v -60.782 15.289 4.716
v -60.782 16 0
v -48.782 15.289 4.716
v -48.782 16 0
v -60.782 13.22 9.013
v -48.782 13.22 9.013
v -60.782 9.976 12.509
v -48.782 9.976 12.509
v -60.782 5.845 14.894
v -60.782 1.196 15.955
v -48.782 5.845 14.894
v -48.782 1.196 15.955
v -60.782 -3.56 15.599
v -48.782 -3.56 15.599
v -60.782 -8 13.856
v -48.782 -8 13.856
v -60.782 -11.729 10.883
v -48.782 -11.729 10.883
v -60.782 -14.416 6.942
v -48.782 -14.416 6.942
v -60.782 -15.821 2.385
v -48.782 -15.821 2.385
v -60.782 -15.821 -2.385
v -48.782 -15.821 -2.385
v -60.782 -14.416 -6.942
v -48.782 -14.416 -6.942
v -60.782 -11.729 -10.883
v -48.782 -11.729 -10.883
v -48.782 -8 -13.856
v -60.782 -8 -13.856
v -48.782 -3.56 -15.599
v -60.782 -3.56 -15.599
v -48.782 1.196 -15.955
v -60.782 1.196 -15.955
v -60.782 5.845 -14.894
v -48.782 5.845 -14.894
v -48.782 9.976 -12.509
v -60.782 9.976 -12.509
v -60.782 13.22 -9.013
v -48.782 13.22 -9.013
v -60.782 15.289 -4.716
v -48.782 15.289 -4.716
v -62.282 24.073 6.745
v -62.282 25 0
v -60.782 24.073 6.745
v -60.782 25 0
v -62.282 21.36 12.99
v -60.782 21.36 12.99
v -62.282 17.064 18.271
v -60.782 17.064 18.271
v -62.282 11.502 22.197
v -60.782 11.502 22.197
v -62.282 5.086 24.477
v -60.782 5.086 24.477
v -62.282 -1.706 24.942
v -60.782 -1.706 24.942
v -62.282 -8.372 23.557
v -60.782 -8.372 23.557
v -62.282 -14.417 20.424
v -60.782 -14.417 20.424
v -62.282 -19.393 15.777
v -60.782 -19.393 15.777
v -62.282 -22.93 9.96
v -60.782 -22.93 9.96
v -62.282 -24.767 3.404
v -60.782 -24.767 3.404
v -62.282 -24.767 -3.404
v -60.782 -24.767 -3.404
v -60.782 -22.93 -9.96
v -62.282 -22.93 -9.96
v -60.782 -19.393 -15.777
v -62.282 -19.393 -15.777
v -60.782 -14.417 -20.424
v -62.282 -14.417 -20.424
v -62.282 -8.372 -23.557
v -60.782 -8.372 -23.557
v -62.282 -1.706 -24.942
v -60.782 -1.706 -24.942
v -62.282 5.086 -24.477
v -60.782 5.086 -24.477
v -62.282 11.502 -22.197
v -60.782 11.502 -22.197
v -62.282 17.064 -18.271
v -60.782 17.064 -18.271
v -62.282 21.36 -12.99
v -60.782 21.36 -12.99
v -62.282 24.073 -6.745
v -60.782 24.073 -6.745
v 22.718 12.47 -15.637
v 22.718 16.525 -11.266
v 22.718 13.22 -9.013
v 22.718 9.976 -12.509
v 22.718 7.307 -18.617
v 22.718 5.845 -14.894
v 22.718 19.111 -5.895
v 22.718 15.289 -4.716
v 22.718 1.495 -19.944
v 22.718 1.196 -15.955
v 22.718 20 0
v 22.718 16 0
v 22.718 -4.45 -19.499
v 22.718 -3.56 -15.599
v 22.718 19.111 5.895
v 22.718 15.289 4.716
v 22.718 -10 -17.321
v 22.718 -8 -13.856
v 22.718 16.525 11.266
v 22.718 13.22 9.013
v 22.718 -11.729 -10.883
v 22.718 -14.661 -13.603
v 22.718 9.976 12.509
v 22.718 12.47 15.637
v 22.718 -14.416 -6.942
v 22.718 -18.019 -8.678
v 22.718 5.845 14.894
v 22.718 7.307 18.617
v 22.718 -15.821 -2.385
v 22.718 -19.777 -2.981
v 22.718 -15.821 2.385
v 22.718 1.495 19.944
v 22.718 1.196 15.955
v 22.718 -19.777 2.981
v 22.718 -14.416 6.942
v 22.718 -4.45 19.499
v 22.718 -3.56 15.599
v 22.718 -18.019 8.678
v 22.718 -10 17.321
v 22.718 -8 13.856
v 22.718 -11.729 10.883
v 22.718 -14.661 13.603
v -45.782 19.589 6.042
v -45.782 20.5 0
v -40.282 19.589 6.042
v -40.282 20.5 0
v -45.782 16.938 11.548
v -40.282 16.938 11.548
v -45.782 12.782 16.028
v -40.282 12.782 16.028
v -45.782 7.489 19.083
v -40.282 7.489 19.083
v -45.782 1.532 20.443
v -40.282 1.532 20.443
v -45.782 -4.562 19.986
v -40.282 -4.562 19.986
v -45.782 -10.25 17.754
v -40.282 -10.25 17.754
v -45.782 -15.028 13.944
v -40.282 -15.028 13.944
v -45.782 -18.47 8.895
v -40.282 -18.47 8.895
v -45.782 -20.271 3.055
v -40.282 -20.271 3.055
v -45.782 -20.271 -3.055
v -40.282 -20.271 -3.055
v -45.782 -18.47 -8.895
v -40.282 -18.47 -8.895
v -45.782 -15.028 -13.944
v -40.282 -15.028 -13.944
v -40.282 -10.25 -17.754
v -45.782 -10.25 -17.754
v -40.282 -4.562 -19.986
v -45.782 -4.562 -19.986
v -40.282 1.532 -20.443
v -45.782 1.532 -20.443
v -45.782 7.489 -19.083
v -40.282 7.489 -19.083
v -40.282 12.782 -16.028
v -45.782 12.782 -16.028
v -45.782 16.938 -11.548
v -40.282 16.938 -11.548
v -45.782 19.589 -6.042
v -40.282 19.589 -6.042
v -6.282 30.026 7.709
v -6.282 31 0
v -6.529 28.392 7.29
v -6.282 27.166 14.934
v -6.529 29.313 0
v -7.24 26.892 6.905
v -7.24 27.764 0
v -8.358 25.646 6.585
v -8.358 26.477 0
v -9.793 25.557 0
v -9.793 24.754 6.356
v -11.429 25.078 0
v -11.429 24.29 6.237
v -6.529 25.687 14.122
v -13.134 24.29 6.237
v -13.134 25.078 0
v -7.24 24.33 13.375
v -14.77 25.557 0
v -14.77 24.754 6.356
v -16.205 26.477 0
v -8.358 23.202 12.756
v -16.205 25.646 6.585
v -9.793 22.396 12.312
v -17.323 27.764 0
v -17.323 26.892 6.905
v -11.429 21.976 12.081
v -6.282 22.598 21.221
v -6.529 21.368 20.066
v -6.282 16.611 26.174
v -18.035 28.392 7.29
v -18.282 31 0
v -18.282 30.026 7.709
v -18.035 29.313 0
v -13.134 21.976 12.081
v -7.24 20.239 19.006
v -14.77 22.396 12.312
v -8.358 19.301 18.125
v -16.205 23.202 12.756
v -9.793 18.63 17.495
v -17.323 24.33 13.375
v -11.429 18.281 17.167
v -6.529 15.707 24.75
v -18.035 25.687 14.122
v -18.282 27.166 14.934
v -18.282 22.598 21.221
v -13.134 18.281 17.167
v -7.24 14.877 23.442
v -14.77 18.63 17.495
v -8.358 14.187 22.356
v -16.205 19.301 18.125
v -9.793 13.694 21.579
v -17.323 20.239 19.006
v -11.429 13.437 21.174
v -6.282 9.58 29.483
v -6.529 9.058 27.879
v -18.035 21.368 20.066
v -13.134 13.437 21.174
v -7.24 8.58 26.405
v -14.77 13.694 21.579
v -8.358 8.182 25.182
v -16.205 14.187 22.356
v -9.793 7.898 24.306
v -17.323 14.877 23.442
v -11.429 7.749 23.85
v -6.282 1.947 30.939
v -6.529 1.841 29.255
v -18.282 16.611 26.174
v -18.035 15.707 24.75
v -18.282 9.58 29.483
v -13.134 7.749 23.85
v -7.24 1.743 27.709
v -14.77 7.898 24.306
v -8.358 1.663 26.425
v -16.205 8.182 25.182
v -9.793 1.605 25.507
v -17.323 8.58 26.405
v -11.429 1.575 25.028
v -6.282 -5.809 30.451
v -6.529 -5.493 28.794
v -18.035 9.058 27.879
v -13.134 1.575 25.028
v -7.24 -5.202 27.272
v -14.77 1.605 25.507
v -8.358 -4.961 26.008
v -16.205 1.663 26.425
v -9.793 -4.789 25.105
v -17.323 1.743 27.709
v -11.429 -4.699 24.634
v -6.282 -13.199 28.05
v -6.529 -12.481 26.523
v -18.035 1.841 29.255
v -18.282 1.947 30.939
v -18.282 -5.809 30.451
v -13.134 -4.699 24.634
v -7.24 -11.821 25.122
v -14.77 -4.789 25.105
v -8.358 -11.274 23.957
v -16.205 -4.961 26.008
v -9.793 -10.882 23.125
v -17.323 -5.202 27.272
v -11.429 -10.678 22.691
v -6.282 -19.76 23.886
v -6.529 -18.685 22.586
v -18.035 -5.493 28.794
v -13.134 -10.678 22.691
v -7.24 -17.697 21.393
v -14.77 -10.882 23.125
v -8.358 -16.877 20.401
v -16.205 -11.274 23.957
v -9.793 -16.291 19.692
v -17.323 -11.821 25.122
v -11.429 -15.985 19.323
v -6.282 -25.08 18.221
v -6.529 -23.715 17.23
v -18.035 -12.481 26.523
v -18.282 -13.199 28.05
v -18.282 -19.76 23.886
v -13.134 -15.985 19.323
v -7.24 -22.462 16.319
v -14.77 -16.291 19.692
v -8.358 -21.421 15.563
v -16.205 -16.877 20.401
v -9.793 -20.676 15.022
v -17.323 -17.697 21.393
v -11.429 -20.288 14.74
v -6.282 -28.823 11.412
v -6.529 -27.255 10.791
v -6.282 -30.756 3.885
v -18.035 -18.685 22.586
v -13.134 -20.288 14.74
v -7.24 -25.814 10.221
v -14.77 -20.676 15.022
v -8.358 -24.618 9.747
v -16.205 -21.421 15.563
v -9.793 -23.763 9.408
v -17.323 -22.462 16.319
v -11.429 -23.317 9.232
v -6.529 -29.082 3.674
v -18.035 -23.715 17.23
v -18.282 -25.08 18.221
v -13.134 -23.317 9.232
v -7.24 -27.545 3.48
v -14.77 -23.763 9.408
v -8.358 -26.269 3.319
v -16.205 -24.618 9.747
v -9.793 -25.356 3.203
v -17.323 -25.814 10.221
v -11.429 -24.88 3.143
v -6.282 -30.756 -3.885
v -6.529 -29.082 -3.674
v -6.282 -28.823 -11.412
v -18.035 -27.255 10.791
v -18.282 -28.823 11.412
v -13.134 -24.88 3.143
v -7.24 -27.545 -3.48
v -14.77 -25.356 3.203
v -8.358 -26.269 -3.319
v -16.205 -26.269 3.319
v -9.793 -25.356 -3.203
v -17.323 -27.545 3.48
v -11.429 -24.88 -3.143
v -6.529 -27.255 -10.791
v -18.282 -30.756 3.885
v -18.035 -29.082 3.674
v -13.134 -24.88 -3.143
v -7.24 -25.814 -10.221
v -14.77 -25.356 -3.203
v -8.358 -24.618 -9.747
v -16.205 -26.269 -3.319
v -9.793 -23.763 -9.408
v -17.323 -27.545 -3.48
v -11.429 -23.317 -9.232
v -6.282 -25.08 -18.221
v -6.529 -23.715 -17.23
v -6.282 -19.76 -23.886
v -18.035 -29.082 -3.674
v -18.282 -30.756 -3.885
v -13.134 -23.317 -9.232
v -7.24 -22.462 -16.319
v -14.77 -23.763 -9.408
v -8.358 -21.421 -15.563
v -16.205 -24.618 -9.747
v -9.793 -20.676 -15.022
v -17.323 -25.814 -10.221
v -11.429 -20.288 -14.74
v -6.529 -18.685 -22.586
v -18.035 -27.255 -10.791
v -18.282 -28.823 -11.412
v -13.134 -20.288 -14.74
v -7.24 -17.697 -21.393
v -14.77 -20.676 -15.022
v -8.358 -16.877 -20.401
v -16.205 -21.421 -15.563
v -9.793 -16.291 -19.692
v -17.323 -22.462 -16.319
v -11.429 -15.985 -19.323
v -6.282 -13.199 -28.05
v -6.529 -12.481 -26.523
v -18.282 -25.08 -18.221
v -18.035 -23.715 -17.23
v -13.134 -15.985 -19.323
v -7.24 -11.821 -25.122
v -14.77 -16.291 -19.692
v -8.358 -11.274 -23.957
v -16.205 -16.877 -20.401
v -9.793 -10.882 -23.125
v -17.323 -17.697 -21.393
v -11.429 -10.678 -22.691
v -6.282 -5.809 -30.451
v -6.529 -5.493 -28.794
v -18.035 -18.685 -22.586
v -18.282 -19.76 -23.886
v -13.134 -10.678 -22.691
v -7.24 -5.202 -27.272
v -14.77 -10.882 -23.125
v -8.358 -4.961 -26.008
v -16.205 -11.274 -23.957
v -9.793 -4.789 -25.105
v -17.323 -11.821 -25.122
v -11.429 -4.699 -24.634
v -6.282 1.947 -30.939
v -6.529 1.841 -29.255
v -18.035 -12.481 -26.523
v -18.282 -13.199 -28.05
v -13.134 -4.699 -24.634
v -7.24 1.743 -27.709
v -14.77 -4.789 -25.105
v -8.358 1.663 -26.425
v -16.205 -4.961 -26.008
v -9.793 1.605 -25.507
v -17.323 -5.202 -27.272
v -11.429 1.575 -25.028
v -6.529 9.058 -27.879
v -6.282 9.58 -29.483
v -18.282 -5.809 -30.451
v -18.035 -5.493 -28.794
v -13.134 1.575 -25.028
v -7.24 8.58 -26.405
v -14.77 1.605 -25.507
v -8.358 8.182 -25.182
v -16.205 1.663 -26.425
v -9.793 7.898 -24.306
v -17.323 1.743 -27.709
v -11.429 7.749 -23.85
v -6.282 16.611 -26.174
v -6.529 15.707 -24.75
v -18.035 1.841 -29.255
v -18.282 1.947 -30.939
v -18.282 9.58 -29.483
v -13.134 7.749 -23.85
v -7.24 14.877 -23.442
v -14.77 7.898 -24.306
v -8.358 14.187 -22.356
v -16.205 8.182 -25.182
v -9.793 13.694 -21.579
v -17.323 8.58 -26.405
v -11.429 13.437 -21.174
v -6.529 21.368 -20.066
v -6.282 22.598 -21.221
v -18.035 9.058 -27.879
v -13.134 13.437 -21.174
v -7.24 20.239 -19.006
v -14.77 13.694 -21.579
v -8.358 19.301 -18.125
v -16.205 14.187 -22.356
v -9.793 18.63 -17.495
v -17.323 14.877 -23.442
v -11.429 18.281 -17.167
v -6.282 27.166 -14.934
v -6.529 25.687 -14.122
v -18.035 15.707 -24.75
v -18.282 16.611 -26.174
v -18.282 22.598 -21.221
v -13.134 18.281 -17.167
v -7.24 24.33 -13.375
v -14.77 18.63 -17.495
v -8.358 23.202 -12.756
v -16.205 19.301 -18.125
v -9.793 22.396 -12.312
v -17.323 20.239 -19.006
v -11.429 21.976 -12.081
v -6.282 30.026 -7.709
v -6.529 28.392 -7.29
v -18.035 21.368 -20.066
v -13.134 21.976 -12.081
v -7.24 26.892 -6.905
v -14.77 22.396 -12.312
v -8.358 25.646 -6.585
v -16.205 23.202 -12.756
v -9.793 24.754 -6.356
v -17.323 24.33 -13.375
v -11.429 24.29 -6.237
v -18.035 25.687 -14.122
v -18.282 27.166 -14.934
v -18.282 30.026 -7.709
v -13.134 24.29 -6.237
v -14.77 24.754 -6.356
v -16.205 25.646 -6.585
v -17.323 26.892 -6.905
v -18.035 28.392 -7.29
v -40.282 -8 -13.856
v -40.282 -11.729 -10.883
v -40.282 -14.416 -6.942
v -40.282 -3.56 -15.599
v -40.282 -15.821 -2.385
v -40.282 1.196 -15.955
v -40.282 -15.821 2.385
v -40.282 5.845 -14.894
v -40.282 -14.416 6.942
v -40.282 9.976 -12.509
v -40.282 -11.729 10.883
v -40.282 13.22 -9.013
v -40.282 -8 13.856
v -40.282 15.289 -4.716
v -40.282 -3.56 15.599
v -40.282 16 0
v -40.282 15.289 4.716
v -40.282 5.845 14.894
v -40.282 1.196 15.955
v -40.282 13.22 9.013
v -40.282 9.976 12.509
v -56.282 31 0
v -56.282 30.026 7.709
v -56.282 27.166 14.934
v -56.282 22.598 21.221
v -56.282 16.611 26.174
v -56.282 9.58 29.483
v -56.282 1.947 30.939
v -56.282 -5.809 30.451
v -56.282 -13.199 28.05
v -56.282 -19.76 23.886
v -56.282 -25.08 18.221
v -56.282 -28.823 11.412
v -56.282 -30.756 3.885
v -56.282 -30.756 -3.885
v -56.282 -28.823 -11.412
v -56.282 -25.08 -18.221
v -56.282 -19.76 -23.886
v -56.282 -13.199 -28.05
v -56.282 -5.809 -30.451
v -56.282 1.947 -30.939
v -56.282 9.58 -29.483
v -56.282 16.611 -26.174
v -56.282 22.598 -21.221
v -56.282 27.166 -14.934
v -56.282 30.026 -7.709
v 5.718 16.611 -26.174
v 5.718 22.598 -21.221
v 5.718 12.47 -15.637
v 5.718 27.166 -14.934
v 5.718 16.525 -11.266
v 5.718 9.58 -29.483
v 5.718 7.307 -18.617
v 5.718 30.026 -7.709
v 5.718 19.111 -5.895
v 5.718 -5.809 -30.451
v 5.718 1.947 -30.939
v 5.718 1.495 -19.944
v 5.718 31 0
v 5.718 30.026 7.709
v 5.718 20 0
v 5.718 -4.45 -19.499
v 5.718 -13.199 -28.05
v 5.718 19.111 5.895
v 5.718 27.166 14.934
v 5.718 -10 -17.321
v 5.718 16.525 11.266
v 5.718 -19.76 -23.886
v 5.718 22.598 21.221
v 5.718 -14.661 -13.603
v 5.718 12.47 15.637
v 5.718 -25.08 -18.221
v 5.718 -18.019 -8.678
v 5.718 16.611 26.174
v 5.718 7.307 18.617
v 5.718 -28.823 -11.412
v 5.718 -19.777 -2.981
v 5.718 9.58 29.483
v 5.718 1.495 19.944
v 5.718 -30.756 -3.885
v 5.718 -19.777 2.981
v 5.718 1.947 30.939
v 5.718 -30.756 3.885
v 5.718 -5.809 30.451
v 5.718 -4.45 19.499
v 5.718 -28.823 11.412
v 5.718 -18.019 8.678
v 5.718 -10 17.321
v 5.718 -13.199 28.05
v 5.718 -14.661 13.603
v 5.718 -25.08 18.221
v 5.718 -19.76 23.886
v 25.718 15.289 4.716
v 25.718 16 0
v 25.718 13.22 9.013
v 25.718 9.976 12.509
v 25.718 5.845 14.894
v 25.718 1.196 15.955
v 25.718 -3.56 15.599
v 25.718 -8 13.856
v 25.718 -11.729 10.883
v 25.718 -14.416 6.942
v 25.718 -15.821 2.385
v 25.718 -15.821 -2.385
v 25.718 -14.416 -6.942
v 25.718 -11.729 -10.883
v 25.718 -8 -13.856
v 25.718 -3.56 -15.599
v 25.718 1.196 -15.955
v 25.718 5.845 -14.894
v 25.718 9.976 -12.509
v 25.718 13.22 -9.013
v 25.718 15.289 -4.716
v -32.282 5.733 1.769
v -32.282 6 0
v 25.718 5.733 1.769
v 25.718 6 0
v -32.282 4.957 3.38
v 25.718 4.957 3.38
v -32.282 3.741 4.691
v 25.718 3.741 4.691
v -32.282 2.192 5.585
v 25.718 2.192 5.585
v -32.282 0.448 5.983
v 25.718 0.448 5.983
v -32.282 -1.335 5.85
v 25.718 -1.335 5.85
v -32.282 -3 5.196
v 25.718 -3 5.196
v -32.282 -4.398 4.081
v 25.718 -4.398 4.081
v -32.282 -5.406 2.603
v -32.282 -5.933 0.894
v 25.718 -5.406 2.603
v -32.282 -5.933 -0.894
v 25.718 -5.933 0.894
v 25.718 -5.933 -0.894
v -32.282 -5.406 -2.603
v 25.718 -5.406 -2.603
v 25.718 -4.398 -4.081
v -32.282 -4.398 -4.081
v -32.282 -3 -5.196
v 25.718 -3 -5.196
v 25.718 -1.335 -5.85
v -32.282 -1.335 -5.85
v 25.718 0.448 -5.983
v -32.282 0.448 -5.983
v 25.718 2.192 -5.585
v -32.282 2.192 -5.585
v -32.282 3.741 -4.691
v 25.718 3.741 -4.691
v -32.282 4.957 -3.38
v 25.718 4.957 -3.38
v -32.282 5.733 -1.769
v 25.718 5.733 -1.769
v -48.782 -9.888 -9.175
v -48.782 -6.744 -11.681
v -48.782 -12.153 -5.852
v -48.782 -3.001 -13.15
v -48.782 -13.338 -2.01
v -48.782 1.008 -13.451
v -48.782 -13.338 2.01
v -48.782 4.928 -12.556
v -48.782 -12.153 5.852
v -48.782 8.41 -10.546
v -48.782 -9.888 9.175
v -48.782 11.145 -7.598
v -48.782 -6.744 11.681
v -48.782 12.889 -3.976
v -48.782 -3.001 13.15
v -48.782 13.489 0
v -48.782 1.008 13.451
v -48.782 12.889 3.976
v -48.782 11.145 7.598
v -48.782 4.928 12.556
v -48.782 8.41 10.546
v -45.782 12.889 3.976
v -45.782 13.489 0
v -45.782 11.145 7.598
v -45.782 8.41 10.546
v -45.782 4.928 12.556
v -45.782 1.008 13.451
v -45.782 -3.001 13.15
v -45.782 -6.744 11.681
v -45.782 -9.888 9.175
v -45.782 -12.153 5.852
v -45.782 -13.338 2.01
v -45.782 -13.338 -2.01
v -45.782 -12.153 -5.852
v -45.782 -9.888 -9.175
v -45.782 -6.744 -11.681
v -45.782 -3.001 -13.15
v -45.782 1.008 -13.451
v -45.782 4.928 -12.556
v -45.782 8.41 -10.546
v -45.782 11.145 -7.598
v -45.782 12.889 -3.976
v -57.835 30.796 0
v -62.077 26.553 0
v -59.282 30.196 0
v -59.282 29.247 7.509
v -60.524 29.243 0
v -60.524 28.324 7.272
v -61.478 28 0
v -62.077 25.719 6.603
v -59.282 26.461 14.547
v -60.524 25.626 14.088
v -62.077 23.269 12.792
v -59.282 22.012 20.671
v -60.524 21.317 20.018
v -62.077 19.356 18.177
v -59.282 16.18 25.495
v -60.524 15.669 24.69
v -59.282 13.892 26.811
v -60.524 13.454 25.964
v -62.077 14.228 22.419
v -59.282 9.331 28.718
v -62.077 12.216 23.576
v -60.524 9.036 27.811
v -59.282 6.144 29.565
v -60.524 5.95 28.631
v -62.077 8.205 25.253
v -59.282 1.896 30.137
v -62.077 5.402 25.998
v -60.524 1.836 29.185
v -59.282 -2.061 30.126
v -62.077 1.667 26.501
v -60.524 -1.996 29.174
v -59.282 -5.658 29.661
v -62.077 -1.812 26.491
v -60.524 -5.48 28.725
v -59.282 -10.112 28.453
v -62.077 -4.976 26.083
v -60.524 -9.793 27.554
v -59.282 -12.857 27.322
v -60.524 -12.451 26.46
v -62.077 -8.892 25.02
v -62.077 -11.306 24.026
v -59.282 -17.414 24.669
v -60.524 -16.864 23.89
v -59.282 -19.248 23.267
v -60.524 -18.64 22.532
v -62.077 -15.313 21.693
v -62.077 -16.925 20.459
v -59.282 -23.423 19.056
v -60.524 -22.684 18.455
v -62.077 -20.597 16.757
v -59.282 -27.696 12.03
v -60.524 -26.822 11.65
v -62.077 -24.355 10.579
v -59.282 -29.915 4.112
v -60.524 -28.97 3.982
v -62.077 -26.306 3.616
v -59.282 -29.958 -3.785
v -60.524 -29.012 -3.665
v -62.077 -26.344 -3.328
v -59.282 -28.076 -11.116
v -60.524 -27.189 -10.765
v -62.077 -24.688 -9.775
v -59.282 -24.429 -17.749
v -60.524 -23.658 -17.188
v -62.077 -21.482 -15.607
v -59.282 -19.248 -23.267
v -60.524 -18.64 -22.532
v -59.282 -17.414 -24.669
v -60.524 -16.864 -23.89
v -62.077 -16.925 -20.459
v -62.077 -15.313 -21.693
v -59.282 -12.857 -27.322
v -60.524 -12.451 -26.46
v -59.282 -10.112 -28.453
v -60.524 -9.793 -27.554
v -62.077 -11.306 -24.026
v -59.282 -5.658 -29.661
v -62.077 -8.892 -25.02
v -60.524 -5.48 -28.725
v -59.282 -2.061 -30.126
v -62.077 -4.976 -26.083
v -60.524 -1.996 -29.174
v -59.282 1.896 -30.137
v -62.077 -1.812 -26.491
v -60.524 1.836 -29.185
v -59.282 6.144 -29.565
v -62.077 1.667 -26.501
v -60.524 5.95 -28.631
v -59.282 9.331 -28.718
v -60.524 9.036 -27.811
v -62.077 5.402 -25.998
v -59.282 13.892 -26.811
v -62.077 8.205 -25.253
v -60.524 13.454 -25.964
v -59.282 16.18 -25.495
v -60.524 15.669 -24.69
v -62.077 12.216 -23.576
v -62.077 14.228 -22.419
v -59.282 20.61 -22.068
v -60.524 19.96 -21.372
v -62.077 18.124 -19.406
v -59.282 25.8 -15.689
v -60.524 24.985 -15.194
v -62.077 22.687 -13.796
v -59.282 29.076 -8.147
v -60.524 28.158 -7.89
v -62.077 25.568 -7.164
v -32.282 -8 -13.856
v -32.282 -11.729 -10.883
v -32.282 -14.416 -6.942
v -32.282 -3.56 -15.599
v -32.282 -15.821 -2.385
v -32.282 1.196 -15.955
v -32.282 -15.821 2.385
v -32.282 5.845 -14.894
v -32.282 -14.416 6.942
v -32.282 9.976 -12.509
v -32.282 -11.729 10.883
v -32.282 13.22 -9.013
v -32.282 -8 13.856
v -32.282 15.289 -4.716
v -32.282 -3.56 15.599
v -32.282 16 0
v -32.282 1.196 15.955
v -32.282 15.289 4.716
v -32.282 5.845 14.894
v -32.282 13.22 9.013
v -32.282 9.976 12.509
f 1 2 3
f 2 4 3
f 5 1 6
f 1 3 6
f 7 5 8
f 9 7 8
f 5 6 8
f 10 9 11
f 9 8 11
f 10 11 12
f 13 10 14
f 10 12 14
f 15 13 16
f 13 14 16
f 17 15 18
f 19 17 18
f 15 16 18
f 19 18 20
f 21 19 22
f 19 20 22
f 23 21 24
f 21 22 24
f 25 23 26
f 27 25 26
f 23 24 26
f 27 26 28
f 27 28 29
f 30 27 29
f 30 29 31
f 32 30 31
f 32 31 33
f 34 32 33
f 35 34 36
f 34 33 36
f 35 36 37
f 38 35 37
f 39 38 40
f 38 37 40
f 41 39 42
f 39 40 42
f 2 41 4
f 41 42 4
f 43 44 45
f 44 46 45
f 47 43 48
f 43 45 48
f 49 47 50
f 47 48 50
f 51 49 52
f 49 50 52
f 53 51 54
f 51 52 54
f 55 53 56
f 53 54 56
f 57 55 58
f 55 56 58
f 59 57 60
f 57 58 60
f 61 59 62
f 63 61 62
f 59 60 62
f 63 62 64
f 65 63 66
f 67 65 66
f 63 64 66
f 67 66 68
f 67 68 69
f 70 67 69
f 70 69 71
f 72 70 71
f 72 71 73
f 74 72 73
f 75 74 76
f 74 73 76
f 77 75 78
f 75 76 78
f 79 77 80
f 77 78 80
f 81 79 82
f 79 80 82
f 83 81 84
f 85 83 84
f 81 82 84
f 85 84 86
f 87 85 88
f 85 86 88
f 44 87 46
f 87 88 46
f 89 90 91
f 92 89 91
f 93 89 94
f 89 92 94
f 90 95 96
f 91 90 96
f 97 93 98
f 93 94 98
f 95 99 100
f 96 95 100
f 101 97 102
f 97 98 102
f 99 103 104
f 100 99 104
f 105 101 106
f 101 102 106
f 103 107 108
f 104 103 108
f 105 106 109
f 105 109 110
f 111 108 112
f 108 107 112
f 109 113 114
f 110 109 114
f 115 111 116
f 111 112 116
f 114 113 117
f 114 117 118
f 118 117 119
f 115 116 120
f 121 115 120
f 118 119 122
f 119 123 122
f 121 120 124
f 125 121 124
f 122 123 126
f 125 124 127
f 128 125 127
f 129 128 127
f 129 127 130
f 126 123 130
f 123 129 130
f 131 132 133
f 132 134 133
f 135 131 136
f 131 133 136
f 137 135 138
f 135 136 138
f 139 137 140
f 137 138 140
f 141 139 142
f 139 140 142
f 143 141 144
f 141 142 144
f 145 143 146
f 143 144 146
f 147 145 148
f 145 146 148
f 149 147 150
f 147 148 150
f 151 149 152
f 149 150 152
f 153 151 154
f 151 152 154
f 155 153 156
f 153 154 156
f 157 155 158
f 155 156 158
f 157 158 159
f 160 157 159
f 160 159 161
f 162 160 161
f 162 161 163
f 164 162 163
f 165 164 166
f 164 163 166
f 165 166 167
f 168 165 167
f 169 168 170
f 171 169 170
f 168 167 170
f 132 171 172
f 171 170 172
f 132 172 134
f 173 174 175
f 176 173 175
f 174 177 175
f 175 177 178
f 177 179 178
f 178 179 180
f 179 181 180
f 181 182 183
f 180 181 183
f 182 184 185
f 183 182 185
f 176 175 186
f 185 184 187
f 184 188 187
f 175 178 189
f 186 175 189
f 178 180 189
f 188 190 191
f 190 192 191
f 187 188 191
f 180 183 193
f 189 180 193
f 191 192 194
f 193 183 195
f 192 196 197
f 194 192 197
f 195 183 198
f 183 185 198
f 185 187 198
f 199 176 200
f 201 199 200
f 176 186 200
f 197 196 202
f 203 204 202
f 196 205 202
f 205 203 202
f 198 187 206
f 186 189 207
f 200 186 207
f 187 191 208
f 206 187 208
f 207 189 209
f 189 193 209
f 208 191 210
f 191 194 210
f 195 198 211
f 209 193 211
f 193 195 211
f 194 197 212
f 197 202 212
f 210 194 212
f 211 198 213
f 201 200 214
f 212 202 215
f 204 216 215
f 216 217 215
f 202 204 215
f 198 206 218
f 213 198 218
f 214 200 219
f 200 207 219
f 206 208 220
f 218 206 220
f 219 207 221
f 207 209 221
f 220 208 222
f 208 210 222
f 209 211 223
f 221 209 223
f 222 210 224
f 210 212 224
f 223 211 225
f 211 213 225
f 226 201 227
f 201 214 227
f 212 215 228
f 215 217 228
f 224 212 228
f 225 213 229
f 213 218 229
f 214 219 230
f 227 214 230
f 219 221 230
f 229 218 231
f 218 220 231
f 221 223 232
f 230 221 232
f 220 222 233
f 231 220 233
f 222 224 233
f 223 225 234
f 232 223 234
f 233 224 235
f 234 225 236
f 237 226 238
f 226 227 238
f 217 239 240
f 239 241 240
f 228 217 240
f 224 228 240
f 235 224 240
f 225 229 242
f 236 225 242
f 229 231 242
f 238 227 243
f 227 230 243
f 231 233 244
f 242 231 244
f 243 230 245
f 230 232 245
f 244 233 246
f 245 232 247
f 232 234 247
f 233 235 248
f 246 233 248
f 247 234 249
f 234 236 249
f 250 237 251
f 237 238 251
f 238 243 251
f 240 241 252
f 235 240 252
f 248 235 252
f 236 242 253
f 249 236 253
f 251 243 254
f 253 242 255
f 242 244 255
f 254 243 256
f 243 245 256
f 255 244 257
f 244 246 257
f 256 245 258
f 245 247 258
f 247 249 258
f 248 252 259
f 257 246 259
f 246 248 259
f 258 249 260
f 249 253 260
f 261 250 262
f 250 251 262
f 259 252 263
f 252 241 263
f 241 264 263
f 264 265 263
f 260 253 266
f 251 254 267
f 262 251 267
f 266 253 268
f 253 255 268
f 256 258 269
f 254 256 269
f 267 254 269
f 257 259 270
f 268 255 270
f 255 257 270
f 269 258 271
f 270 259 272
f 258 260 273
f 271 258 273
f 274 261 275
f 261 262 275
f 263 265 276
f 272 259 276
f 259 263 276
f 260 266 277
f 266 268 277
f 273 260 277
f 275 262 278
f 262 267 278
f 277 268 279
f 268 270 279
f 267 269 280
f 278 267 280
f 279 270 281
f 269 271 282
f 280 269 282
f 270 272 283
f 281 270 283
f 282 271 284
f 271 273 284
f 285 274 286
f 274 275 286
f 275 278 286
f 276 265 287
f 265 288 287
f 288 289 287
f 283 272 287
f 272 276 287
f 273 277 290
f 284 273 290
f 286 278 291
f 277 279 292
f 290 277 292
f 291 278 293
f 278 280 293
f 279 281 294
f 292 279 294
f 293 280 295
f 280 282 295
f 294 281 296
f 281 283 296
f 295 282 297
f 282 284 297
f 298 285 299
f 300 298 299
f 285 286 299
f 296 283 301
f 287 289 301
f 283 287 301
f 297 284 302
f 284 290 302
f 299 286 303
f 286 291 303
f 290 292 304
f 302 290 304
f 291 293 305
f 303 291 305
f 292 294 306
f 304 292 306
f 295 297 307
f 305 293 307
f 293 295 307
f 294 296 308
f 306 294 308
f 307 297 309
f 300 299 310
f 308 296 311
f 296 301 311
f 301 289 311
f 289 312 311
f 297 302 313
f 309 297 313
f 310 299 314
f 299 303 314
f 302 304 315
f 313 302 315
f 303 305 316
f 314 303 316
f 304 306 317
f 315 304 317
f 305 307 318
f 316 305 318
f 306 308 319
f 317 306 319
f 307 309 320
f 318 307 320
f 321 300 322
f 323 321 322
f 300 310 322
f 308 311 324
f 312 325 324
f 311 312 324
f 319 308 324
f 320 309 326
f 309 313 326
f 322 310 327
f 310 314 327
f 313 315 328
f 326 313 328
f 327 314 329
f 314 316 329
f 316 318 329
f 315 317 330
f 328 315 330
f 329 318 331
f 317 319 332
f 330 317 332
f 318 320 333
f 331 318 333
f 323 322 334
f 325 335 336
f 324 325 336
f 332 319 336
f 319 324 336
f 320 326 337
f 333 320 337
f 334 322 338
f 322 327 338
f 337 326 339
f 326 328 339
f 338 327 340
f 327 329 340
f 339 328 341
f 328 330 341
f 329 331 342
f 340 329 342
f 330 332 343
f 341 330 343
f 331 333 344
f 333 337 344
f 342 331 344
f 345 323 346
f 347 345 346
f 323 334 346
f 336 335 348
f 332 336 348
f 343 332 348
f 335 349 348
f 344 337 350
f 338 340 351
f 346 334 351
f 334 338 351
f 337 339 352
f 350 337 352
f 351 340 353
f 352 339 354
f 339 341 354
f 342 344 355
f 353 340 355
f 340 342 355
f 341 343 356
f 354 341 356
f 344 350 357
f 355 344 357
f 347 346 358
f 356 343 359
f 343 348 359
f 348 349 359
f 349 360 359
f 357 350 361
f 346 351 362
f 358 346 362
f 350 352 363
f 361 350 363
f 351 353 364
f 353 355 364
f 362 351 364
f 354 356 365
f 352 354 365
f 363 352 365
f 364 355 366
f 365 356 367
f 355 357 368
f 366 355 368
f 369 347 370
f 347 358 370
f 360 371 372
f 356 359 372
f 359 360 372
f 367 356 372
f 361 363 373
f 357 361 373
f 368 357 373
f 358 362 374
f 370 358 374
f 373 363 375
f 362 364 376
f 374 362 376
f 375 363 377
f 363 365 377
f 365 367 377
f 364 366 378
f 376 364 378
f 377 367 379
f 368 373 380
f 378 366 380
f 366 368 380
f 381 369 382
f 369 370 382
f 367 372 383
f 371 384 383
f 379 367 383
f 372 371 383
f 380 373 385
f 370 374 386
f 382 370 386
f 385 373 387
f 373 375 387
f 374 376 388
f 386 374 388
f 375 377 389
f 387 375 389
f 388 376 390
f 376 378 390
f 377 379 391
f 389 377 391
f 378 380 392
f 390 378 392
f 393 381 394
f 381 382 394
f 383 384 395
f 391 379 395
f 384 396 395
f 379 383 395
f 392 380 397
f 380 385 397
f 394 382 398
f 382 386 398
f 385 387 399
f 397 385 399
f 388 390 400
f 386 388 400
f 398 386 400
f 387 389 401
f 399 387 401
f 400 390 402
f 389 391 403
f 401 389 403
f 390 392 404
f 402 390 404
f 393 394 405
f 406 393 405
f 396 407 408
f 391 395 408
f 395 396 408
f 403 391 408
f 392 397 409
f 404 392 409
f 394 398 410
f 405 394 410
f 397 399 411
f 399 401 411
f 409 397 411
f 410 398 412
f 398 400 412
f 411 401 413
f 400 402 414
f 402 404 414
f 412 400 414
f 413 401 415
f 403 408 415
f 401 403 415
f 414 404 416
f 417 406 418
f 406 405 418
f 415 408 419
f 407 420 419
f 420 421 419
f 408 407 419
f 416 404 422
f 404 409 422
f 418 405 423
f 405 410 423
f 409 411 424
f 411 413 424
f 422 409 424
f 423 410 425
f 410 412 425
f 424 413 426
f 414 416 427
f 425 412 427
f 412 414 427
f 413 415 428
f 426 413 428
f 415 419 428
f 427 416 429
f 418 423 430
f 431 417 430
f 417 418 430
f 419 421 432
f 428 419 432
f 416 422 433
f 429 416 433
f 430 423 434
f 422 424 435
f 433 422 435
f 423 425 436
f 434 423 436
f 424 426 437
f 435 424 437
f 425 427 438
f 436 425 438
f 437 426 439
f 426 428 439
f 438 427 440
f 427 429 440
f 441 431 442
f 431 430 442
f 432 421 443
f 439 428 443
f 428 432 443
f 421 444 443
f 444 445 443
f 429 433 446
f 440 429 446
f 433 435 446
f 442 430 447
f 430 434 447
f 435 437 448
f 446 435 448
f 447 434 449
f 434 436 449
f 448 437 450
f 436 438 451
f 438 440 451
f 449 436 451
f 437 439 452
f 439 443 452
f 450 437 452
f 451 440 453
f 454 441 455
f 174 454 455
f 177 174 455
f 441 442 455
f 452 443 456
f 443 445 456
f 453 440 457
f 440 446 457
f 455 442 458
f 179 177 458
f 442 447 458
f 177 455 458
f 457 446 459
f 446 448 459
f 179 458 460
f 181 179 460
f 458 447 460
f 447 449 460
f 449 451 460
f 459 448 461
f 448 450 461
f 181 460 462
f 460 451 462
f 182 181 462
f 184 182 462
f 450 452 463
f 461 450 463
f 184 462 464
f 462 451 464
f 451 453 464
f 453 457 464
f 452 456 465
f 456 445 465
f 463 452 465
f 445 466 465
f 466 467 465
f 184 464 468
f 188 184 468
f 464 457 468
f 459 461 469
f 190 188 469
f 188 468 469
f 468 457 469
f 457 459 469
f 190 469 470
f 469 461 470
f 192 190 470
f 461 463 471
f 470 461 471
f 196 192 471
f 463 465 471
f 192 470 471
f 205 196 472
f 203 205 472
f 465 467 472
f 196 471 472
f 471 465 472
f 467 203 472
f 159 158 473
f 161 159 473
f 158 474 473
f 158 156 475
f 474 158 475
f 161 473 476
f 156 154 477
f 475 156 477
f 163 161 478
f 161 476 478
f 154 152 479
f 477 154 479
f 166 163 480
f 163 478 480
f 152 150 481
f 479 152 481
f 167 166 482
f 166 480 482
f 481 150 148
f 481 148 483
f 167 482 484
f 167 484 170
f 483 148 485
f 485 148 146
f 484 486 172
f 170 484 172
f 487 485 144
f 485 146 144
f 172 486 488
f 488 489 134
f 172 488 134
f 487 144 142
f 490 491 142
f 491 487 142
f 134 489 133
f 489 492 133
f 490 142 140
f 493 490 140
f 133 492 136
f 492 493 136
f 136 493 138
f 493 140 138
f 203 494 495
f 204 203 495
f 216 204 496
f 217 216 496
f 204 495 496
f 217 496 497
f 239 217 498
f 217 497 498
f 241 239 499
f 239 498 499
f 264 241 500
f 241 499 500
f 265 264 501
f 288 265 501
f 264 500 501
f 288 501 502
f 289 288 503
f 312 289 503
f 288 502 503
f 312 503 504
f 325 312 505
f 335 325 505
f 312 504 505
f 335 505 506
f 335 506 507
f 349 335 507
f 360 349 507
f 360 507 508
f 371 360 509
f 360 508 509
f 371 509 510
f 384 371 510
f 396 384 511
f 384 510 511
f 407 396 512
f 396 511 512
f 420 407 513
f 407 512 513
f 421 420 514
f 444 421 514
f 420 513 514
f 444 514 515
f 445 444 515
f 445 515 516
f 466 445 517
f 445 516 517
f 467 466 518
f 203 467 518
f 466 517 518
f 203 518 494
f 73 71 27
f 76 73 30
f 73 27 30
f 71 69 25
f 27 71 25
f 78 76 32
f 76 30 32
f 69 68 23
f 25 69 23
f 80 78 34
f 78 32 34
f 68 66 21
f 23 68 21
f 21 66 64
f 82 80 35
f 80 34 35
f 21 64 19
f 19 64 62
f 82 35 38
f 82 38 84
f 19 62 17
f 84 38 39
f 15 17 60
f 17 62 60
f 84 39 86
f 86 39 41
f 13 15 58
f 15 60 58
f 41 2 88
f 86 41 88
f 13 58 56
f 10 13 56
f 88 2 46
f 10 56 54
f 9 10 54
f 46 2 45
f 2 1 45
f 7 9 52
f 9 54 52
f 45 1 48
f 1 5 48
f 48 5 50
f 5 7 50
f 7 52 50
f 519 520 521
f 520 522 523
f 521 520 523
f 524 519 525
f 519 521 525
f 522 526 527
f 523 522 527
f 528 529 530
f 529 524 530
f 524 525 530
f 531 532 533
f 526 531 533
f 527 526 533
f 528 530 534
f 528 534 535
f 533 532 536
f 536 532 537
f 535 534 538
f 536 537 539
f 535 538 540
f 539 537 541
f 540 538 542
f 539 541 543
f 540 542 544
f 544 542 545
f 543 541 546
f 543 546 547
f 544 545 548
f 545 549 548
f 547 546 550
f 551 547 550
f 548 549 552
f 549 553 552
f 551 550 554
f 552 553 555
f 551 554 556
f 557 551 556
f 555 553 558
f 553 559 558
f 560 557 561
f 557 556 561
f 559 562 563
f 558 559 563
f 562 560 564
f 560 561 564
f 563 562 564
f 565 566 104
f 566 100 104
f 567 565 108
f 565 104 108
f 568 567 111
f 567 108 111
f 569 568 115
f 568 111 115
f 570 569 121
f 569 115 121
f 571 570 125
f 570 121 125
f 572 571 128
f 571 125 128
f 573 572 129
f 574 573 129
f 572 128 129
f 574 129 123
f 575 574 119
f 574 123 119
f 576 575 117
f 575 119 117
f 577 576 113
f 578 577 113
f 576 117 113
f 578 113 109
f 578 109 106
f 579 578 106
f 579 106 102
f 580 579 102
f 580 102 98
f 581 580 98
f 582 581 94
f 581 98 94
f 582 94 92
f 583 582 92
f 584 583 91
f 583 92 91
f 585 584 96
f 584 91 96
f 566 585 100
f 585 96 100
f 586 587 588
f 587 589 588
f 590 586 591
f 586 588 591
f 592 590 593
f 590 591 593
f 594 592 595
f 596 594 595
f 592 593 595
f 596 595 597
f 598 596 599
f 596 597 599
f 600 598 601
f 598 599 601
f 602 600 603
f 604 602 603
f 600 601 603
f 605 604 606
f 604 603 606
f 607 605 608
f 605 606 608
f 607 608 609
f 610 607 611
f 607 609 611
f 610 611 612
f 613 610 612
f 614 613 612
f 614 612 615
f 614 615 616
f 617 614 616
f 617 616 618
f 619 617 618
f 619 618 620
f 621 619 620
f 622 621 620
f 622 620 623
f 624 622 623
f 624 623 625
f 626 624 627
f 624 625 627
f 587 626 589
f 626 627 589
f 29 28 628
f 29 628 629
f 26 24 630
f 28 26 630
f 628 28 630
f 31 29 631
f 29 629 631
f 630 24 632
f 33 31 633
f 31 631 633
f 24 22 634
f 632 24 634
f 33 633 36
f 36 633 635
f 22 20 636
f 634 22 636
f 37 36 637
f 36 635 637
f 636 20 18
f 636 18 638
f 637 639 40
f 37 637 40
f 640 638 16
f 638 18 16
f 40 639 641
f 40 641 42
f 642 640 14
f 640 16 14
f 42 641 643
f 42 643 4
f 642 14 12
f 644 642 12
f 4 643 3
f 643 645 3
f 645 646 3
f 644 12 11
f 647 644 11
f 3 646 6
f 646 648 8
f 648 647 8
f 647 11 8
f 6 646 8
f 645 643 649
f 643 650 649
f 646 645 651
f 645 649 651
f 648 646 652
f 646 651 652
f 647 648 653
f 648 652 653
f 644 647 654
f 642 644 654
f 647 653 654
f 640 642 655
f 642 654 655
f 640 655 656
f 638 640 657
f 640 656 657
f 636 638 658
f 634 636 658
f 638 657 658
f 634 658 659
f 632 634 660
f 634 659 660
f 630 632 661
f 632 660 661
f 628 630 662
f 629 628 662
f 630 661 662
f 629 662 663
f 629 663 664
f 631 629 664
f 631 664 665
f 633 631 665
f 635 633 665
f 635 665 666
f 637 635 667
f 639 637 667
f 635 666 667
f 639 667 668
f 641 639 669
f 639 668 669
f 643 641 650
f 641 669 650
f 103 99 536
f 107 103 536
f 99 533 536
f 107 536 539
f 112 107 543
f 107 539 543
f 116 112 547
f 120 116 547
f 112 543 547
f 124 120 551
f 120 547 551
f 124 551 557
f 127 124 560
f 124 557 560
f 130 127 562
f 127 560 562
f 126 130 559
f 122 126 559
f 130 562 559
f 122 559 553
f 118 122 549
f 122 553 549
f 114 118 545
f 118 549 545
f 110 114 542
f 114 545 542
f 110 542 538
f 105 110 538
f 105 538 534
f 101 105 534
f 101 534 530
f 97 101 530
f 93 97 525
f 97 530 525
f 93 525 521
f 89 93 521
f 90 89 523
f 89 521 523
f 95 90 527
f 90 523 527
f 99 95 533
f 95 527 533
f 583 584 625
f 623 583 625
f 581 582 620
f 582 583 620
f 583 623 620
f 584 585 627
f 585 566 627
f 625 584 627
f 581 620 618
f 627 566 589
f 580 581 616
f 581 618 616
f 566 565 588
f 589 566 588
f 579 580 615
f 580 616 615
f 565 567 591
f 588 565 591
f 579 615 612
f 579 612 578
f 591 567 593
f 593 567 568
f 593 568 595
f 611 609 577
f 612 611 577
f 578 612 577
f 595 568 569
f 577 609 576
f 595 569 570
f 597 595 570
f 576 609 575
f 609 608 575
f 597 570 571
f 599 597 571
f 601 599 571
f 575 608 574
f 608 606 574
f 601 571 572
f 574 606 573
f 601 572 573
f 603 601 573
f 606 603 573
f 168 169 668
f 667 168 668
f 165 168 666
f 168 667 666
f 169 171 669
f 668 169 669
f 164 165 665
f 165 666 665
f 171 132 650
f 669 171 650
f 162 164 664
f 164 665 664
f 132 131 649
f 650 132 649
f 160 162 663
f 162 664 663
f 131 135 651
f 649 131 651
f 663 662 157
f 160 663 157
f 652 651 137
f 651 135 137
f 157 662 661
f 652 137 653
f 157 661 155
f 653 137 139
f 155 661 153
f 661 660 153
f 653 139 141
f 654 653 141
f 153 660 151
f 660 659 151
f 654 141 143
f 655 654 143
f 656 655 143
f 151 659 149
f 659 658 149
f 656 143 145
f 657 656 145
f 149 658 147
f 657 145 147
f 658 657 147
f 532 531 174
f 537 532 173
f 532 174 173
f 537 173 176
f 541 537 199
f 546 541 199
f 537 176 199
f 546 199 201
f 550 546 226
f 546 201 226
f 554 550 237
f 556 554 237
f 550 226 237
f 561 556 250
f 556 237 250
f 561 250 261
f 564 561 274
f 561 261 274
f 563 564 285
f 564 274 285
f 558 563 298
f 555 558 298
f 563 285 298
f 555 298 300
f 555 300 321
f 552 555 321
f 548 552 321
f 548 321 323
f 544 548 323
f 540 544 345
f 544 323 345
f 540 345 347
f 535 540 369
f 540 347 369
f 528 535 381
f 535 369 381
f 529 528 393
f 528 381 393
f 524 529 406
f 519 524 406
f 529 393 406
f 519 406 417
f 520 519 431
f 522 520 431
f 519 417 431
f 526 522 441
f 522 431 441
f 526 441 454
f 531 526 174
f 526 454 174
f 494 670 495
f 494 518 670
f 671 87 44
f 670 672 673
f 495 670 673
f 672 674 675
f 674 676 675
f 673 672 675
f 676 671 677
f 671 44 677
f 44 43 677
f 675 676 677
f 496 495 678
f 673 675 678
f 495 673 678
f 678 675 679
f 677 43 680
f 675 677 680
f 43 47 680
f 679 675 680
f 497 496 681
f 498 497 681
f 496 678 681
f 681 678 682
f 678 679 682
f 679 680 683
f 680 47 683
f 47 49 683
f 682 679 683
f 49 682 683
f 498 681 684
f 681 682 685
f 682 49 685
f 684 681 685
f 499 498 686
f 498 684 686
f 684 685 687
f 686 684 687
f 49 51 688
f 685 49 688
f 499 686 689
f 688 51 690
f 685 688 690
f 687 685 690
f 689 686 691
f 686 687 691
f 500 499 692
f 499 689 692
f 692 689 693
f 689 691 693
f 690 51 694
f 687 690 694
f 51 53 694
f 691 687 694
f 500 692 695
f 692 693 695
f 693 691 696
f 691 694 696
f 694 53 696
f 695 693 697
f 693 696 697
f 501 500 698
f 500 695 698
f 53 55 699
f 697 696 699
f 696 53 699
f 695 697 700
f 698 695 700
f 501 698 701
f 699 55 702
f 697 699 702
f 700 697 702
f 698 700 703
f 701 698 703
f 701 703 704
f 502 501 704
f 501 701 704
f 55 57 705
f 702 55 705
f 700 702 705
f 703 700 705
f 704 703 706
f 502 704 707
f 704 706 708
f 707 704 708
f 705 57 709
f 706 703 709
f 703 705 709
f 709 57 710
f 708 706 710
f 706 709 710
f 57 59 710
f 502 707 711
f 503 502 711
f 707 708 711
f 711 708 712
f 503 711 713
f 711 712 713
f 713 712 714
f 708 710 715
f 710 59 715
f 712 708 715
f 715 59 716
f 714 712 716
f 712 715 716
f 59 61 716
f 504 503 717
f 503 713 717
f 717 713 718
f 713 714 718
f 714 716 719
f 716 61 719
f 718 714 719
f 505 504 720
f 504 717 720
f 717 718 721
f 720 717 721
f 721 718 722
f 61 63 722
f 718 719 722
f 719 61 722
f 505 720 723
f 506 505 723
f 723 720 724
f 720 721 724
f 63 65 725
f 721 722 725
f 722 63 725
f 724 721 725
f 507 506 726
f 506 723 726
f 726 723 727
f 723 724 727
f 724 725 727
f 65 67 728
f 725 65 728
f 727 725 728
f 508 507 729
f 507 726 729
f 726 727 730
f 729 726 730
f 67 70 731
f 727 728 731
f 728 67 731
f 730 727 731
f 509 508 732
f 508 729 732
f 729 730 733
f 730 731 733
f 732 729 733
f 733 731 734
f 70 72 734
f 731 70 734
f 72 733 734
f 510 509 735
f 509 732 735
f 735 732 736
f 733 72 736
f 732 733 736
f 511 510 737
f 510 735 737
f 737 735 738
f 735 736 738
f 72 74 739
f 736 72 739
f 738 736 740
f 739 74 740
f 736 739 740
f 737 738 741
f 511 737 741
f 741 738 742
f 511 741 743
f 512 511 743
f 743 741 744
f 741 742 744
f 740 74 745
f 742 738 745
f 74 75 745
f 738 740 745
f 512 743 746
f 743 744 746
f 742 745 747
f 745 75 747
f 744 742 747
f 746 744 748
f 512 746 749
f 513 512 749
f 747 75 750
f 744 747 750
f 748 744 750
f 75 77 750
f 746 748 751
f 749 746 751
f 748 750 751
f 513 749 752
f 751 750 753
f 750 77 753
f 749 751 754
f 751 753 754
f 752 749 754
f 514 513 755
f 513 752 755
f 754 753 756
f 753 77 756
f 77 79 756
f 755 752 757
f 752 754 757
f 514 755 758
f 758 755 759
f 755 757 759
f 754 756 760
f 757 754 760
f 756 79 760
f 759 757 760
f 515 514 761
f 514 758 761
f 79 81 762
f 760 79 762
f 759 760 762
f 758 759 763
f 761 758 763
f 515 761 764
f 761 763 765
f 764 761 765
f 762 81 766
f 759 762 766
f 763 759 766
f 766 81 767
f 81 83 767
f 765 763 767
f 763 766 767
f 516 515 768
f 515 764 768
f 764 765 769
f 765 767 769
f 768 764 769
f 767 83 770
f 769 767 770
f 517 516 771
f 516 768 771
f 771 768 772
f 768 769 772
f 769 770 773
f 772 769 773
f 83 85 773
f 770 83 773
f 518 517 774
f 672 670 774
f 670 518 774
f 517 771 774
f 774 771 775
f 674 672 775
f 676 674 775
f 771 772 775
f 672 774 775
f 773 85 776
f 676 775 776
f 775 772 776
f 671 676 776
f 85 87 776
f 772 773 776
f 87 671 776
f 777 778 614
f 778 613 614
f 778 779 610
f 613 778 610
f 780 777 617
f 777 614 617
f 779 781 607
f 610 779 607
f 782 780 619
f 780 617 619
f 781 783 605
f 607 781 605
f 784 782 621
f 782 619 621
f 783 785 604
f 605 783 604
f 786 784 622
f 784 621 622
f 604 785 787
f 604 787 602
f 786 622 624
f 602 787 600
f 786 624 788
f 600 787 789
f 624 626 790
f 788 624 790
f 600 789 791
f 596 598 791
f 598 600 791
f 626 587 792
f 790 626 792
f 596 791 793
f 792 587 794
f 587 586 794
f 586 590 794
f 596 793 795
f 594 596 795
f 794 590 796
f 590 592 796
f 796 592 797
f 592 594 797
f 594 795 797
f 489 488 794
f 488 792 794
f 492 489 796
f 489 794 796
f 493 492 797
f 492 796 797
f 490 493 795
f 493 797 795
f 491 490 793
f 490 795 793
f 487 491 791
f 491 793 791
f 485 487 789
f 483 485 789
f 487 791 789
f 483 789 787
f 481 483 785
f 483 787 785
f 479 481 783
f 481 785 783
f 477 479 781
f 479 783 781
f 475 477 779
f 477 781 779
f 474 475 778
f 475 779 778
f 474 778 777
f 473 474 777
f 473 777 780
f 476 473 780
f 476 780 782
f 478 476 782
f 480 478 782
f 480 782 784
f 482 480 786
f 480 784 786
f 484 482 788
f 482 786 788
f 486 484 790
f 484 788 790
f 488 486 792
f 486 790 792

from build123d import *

# Parameters (mm, degrees)
F2_R = 5.99999


# Not quite as in the source:
# - a fillet or chamfer is up to 0.001 mm smaller than in the source, because OpenCascade refuses the exact size


with BuildPart() as f1:
    # F0 (on Top) → F1 (revolve)
    with BuildSketch(Plane.XY):
        with BuildLine():
            Line((-32.2816833258, 6), (25.7183166742, 6))
            Line((25.7183166742, 6), (25.7183166742, 16))
            Line((25.7183166742, 16), (22.7183166742, 16))
            Line((22.7183166742, 16), (22.7183166742, 20))
            Line((22.7183166742, 20), (5.7183166742, 20))
            Line((5.7183166742, 20), (5.7183166742, 31))
            Line((5.7183166742, 31), (-6.2816833258, 31))
            ThreePointArc((-6.2816833258, 31), (-12.2816833258, 25.0169717373), (-18.2816833258, 31))
            Line((-18.2816833258, 31), (-62.2816833258, 31))
            Line((-62.2816833258, 31), (-62.2816833258, 25))
            Line((-62.2816833258, 25), (-60.7816833258, 25))
            Line((-60.7816833258, 25), (-60.7816833258, 16))
            Line((-60.7816833258, 16), (-48.7816833258, 16))
            Line((-48.7816833258, 16), (-48.7816833258, 13.4885394946))
            Line((-48.7816833258, 13.4885394946), (-45.7816833258, 13.4885394946))
            Line((-45.7816833258, 13.4885394946), (-45.7816833258, 20.5))
            Line((-45.7816833258, 20.5), (-40.2816833258, 20.5))
            Line((-40.2816833258, 20.5), (-40.2816833258, 16))
            Line((-40.2816833258, 16), (-32.2816833258, 16))
            Line((-32.2816833258, 16), (-32.2816833258, 6))
        make_face()
    revolve(axis=Axis((-40.0854273438, 0, 0), (1, 0, 0)))

    # F2 (radius 6 in the source; OpenCascade refuses exactly that, so slightly less here)
    f2_edges = [f1.edges().sort_by_distance(p)[0] for p in [
        (-62.281683, -31, 0),
    ]]
    fillet(f2_edges, radius=F2_R)


solid = f1.part
